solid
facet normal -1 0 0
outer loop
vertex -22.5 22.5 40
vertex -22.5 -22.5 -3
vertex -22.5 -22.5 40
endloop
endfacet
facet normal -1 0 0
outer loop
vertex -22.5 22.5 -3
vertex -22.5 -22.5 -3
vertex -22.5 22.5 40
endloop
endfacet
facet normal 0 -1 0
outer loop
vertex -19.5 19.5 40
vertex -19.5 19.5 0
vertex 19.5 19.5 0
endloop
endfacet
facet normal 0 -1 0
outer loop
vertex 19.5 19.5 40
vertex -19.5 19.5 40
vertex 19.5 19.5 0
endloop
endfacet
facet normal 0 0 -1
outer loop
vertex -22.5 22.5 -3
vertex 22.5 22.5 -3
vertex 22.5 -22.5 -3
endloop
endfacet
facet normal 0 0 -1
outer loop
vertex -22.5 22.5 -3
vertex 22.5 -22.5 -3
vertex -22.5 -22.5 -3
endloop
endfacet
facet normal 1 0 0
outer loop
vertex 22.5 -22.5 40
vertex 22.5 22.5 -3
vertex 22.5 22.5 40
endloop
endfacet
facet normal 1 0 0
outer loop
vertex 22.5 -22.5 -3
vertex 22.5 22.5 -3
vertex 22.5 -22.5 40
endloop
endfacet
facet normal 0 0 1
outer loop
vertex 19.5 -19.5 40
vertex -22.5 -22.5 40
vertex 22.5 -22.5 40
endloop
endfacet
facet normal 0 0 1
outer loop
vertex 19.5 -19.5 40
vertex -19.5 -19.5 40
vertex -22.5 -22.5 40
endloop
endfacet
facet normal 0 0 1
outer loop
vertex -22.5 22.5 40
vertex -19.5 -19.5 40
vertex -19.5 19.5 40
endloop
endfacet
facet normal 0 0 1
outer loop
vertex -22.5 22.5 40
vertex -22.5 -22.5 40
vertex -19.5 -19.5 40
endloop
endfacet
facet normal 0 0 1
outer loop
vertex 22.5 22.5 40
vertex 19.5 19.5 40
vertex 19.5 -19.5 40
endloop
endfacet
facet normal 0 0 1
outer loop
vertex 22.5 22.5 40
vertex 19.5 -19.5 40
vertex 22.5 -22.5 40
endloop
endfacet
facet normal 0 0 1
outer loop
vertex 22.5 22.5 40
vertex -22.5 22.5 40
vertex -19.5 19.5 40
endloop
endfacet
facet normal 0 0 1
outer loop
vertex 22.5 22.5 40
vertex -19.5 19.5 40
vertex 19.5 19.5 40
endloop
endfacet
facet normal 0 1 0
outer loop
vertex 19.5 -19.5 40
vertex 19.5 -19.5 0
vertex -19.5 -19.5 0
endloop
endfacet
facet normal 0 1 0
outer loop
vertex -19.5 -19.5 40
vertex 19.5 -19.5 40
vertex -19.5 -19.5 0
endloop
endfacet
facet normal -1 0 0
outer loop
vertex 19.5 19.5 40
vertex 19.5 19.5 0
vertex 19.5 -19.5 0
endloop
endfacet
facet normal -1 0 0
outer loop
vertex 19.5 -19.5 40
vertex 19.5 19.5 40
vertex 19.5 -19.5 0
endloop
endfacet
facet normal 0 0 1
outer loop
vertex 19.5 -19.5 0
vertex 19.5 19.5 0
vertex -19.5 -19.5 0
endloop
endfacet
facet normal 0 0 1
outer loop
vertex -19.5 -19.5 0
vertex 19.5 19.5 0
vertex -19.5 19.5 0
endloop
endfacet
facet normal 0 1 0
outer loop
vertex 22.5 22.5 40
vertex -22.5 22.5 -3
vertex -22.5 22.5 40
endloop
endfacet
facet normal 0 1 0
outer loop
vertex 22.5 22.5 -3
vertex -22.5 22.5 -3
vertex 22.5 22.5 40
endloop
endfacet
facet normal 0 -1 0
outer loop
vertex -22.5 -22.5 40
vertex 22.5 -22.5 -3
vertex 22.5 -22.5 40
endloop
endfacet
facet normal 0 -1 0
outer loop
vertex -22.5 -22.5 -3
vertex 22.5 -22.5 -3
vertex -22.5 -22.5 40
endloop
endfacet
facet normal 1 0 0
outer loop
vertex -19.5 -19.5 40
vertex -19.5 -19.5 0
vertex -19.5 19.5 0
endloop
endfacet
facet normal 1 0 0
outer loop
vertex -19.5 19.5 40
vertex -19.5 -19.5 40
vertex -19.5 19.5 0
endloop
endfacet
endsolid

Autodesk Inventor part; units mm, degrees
ref_plane "YZ Plane" through (0, 0, 0) normal (1, 0, 0) x (0, 1, 0)
ref_plane "XZ Plane" through (0, 0, 0) normal (0, 1, 0) x (-1, 0, 0)
ref_plane "XY Plane" through (0, 0, 0) normal (0, 0, 1) x (1, 0, 0)
sketch "Sketch1" plane through (0, 0, 0) normal (0, 0, 1) x (1, 0, 0)
  line L0 (0, 31.5) -> (0, -31.5) construction
  line L1 (-31.5, 0) -> (31.5, 0) construction
  line L2 (-19.5, 19.5) -> (19.5, 19.5)
  line L3 (19.5, 19.5) -> (19.5, -19.5)
  line L4 (19.5, -19.5) -> (-19.5, -19.5)
  line L5 (-19.5, -19.5) -> (-19.5, 19.5)
  line L6 (-22.5, 22.5) -> (22.5, 22.5)
  line L7 (22.5, 22.5) -> (22.5, -22.5)
  line L8 (22.5, -22.5) -> (-22.5, -22.5)
  line L9 (-22.5, -22.5) -> (-22.5, 22.5)
  point P0 (0, 0)
  dimension "d0" = 39
  dimension "d1" = 39
  dimension "d2" = 3
  dimension "d3" = 3
  dimension "d4" = 3
  dimension "d5" = 3
extrude "Extrusion1" add sketch "Sketch1" along normal blind 40
sketch "Sketch2" plane through (0, 0, 0) normal (0, 0, -1) x (-1, 0, 0)
  line L0 (-22.5, -22.5) -> (22.5, -22.5) projected
  line L1 (22.5, -22.5) -> (22.5, 22.5) projected
  line L2 (22.5, 22.5) -> (-22.5, 22.5) projected
  line L3 (-22.5, 22.5) -> (-22.5, -22.5) projected
  point P0 (0, 0)
extrude "Extrusion2" add sketch "Sketch2" along normal blind 3
properties part number "Cuvette_45x45x40" material "Glass"
